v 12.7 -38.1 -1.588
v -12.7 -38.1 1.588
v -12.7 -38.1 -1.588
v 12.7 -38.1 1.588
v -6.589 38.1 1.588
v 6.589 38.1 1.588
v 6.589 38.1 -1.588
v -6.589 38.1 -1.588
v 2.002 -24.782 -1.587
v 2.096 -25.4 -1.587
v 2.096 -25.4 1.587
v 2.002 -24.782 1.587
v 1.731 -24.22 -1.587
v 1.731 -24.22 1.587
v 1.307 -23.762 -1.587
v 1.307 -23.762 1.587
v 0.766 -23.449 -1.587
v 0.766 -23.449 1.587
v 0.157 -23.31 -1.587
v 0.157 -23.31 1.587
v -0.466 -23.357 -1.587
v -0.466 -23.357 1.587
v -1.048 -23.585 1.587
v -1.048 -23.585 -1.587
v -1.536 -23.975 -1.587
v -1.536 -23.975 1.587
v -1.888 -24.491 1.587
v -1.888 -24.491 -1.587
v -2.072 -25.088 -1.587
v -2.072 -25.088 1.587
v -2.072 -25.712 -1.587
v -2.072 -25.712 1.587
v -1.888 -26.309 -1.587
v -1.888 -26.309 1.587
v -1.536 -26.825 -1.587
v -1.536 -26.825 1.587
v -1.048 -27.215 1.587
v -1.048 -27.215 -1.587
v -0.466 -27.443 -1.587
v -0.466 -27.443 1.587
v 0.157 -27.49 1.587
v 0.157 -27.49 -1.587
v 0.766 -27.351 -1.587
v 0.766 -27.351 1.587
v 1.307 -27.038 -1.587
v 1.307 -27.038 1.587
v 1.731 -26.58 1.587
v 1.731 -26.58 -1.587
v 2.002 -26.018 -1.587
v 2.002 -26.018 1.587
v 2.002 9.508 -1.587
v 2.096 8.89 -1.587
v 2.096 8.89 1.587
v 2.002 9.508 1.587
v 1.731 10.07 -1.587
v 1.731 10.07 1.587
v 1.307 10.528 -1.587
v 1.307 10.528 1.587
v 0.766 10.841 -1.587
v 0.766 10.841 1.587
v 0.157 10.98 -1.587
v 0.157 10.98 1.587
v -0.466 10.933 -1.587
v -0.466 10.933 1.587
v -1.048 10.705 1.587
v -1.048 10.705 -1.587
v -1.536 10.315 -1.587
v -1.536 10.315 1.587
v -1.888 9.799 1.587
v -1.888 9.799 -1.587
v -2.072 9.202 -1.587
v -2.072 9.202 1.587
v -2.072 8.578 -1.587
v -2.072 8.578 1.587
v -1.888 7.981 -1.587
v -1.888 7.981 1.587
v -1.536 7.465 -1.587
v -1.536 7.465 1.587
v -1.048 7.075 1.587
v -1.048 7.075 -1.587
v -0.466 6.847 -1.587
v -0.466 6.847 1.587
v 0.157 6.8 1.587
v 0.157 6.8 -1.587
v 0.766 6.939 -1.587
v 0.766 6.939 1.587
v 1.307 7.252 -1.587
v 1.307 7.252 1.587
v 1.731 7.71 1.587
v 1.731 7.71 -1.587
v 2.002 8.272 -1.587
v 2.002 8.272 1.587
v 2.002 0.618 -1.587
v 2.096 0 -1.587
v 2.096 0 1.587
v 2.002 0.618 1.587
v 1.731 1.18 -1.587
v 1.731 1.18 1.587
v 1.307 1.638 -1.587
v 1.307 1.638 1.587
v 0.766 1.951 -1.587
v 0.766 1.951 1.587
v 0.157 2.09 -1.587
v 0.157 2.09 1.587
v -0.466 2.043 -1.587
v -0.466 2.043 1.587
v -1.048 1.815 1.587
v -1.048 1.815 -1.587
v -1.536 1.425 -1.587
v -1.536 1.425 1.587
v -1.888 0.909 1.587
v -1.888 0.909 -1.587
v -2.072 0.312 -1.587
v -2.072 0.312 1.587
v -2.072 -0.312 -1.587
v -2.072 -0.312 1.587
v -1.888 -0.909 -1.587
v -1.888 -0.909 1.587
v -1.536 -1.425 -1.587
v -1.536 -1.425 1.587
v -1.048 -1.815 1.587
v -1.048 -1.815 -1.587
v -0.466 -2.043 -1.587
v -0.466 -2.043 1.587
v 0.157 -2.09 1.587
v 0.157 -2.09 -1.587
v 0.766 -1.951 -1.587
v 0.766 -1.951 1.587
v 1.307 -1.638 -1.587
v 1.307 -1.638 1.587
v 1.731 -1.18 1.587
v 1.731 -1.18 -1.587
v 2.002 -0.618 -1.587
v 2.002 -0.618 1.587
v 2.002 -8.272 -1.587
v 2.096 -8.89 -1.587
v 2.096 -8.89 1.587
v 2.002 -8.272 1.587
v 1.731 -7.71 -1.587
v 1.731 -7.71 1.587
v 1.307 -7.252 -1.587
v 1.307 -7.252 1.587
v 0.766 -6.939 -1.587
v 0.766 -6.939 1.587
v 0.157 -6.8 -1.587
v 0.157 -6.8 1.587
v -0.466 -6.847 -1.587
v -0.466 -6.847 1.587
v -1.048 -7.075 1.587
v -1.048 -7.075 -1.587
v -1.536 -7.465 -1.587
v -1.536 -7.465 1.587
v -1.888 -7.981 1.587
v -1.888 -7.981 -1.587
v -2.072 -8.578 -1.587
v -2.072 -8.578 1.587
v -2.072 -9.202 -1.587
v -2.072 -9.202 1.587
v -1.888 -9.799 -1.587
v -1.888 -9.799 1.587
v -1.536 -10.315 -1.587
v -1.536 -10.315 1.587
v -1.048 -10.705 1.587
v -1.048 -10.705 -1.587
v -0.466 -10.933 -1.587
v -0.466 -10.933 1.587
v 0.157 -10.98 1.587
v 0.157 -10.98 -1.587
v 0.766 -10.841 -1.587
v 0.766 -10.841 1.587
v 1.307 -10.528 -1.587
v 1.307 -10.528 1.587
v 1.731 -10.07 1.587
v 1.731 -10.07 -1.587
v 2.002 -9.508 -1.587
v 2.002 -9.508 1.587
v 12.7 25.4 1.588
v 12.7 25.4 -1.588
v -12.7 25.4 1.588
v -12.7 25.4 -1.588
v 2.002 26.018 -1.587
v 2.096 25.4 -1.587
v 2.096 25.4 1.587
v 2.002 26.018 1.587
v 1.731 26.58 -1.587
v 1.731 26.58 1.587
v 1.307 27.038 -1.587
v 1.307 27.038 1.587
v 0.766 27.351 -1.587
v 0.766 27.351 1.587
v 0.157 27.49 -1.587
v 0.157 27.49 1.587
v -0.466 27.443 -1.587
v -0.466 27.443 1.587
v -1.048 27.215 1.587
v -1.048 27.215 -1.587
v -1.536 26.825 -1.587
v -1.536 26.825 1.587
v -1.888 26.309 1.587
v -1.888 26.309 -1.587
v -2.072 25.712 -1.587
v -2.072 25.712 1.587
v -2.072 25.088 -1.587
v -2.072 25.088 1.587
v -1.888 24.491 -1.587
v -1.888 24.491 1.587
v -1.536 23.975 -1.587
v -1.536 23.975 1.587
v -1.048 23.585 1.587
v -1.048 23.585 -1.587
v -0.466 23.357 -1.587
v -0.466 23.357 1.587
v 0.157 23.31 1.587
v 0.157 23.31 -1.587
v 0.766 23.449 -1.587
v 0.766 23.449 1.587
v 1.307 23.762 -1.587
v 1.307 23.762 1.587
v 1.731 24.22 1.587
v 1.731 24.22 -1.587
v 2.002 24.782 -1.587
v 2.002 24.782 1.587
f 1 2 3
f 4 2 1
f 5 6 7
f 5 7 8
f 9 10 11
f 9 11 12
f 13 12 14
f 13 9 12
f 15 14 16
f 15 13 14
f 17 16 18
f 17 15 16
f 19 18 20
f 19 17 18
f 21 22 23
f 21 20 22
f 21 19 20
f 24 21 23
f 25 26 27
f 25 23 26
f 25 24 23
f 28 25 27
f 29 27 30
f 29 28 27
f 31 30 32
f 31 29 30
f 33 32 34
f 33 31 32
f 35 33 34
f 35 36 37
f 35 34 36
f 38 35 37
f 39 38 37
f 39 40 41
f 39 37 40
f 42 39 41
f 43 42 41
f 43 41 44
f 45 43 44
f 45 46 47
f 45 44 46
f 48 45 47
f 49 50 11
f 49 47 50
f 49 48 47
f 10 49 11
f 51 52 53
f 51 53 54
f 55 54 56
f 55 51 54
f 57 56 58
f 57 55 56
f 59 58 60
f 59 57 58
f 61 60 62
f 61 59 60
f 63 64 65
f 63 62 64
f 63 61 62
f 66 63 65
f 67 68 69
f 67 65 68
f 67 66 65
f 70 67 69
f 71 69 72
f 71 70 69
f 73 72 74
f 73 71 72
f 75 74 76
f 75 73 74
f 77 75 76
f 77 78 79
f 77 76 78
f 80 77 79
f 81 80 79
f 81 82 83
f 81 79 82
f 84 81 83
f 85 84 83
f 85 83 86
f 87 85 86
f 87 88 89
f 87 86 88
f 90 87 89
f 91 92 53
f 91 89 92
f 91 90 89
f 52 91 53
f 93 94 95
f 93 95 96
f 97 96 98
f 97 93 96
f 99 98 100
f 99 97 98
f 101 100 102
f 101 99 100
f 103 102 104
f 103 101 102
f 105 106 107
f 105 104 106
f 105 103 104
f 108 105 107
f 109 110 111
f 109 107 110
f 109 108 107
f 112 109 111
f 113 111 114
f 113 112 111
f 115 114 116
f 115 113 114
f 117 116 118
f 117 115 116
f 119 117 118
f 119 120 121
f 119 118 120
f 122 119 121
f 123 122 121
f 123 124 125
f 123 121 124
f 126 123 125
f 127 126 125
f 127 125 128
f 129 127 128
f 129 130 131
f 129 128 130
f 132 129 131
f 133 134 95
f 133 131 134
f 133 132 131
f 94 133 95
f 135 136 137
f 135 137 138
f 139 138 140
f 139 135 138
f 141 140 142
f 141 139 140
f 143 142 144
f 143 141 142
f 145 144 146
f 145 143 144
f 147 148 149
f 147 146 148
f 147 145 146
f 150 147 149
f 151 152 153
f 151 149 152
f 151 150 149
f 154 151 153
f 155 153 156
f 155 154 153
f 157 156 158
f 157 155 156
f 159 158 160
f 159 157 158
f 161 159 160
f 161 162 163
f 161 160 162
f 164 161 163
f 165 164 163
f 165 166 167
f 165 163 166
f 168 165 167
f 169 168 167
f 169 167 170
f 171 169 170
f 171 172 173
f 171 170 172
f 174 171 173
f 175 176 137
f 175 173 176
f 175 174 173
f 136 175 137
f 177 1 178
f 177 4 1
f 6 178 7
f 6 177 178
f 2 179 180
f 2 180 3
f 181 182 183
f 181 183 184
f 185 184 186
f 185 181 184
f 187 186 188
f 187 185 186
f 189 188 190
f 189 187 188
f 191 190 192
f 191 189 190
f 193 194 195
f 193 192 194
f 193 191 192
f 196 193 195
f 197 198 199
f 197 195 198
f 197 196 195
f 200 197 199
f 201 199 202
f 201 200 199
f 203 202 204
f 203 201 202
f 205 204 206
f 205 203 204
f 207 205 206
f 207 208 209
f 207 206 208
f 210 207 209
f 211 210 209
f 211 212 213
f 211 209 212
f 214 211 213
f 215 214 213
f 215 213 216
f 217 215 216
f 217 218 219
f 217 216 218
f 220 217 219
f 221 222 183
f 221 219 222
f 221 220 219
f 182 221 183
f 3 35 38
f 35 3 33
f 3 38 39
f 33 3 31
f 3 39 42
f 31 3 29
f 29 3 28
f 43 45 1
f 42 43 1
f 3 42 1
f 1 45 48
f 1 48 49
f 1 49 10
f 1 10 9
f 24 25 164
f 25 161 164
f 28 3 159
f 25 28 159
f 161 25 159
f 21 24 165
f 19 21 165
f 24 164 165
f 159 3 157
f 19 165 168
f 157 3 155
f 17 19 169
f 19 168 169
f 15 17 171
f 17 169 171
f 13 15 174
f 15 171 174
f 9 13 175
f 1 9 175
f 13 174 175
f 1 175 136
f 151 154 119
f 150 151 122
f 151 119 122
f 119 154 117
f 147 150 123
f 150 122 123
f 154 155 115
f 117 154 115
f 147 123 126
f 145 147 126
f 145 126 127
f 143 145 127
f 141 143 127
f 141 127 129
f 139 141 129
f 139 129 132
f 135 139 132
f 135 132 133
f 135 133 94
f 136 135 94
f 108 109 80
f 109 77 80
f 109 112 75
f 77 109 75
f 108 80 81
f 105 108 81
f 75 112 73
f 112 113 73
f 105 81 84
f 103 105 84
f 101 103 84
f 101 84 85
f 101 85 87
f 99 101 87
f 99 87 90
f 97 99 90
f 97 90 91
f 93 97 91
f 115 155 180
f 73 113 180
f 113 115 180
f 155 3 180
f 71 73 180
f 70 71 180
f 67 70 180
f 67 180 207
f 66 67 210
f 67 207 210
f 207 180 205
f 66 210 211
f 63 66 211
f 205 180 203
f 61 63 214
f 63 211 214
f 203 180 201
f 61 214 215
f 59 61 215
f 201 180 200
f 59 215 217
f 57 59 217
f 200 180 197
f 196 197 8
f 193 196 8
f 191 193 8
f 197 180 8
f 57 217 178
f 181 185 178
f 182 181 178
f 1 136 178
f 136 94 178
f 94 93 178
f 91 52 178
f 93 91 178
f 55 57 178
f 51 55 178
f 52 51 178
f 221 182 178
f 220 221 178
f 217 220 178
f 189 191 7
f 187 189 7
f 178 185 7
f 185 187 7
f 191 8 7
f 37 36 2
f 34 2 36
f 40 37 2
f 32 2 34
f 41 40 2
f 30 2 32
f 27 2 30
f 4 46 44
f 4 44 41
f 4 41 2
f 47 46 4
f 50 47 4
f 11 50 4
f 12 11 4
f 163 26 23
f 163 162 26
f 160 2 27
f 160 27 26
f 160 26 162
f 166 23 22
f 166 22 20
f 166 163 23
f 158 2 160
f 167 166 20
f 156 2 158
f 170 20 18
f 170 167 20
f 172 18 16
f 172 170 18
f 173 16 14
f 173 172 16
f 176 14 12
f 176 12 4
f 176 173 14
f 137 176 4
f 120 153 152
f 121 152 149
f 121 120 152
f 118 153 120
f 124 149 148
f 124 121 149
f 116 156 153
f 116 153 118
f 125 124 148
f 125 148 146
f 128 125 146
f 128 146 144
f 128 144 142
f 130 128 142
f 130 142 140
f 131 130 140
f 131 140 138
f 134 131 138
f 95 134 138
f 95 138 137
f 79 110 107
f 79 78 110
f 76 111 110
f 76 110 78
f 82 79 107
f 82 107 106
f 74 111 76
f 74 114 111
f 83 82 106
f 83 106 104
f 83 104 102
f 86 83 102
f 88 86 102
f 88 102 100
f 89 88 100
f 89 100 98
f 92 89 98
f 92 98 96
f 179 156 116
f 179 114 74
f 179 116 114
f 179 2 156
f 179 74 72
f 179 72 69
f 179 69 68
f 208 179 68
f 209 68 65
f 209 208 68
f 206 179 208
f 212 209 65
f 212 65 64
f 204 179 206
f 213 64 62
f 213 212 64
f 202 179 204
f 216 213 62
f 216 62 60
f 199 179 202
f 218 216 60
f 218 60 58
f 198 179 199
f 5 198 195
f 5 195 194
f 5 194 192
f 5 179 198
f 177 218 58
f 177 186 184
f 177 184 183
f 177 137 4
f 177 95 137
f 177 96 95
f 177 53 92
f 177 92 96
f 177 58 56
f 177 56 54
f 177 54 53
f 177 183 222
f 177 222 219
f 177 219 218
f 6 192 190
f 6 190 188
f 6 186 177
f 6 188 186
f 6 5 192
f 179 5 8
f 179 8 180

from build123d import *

# Parameters (mm, degrees)
BOSS_EXTRUDE1_DEPTH     = 1.5875
CUT_EXTRUDE1_DEPTH      = 41.286233691
CUT_EXTRUDE1_DEPTH_BACK = 41.286233691
SKETCH2_R               = 2.0955


with BuildPart() as part:
    # Sketch1 → Boss-Extrude1 (new, symmetric)
    with BuildSketch(Plane.XY):
        Polygon((12.7, 25.4), (6.588707745, 38.1), (-6.588707745, 38.1), (-12.7, 25.4), (-12.7, -38.1), (12.7, -38.1), align=None)
    extrude(amount=BOSS_EXTRUDE1_DEPTH, both=True)

    # Sketch2 → Cut-Extrude1 (cut, two sides: drawn at the far end of the back side and taken through both)
    with BuildSketch(Plane.XY.offset(1.5875).offset(-CUT_EXTRUDE1_DEPTH_BACK)):
        with Locations((0, -25.4)):
            Circle(SKETCH2_R)
        Circle(SKETCH2_R)
        with Locations((0, 25.4)):
            Circle(SKETCH2_R)
        with Locations((0, -8.89)):
            Circle(SKETCH2_R)
        with Locations((0, 8.89)):
            Circle(SKETCH2_R)
    extrude(amount=CUT_EXTRUDE1_DEPTH + CUT_EXTRUDE1_DEPTH_BACK, mode=Mode.SUBTRACT)


solid = part.part
